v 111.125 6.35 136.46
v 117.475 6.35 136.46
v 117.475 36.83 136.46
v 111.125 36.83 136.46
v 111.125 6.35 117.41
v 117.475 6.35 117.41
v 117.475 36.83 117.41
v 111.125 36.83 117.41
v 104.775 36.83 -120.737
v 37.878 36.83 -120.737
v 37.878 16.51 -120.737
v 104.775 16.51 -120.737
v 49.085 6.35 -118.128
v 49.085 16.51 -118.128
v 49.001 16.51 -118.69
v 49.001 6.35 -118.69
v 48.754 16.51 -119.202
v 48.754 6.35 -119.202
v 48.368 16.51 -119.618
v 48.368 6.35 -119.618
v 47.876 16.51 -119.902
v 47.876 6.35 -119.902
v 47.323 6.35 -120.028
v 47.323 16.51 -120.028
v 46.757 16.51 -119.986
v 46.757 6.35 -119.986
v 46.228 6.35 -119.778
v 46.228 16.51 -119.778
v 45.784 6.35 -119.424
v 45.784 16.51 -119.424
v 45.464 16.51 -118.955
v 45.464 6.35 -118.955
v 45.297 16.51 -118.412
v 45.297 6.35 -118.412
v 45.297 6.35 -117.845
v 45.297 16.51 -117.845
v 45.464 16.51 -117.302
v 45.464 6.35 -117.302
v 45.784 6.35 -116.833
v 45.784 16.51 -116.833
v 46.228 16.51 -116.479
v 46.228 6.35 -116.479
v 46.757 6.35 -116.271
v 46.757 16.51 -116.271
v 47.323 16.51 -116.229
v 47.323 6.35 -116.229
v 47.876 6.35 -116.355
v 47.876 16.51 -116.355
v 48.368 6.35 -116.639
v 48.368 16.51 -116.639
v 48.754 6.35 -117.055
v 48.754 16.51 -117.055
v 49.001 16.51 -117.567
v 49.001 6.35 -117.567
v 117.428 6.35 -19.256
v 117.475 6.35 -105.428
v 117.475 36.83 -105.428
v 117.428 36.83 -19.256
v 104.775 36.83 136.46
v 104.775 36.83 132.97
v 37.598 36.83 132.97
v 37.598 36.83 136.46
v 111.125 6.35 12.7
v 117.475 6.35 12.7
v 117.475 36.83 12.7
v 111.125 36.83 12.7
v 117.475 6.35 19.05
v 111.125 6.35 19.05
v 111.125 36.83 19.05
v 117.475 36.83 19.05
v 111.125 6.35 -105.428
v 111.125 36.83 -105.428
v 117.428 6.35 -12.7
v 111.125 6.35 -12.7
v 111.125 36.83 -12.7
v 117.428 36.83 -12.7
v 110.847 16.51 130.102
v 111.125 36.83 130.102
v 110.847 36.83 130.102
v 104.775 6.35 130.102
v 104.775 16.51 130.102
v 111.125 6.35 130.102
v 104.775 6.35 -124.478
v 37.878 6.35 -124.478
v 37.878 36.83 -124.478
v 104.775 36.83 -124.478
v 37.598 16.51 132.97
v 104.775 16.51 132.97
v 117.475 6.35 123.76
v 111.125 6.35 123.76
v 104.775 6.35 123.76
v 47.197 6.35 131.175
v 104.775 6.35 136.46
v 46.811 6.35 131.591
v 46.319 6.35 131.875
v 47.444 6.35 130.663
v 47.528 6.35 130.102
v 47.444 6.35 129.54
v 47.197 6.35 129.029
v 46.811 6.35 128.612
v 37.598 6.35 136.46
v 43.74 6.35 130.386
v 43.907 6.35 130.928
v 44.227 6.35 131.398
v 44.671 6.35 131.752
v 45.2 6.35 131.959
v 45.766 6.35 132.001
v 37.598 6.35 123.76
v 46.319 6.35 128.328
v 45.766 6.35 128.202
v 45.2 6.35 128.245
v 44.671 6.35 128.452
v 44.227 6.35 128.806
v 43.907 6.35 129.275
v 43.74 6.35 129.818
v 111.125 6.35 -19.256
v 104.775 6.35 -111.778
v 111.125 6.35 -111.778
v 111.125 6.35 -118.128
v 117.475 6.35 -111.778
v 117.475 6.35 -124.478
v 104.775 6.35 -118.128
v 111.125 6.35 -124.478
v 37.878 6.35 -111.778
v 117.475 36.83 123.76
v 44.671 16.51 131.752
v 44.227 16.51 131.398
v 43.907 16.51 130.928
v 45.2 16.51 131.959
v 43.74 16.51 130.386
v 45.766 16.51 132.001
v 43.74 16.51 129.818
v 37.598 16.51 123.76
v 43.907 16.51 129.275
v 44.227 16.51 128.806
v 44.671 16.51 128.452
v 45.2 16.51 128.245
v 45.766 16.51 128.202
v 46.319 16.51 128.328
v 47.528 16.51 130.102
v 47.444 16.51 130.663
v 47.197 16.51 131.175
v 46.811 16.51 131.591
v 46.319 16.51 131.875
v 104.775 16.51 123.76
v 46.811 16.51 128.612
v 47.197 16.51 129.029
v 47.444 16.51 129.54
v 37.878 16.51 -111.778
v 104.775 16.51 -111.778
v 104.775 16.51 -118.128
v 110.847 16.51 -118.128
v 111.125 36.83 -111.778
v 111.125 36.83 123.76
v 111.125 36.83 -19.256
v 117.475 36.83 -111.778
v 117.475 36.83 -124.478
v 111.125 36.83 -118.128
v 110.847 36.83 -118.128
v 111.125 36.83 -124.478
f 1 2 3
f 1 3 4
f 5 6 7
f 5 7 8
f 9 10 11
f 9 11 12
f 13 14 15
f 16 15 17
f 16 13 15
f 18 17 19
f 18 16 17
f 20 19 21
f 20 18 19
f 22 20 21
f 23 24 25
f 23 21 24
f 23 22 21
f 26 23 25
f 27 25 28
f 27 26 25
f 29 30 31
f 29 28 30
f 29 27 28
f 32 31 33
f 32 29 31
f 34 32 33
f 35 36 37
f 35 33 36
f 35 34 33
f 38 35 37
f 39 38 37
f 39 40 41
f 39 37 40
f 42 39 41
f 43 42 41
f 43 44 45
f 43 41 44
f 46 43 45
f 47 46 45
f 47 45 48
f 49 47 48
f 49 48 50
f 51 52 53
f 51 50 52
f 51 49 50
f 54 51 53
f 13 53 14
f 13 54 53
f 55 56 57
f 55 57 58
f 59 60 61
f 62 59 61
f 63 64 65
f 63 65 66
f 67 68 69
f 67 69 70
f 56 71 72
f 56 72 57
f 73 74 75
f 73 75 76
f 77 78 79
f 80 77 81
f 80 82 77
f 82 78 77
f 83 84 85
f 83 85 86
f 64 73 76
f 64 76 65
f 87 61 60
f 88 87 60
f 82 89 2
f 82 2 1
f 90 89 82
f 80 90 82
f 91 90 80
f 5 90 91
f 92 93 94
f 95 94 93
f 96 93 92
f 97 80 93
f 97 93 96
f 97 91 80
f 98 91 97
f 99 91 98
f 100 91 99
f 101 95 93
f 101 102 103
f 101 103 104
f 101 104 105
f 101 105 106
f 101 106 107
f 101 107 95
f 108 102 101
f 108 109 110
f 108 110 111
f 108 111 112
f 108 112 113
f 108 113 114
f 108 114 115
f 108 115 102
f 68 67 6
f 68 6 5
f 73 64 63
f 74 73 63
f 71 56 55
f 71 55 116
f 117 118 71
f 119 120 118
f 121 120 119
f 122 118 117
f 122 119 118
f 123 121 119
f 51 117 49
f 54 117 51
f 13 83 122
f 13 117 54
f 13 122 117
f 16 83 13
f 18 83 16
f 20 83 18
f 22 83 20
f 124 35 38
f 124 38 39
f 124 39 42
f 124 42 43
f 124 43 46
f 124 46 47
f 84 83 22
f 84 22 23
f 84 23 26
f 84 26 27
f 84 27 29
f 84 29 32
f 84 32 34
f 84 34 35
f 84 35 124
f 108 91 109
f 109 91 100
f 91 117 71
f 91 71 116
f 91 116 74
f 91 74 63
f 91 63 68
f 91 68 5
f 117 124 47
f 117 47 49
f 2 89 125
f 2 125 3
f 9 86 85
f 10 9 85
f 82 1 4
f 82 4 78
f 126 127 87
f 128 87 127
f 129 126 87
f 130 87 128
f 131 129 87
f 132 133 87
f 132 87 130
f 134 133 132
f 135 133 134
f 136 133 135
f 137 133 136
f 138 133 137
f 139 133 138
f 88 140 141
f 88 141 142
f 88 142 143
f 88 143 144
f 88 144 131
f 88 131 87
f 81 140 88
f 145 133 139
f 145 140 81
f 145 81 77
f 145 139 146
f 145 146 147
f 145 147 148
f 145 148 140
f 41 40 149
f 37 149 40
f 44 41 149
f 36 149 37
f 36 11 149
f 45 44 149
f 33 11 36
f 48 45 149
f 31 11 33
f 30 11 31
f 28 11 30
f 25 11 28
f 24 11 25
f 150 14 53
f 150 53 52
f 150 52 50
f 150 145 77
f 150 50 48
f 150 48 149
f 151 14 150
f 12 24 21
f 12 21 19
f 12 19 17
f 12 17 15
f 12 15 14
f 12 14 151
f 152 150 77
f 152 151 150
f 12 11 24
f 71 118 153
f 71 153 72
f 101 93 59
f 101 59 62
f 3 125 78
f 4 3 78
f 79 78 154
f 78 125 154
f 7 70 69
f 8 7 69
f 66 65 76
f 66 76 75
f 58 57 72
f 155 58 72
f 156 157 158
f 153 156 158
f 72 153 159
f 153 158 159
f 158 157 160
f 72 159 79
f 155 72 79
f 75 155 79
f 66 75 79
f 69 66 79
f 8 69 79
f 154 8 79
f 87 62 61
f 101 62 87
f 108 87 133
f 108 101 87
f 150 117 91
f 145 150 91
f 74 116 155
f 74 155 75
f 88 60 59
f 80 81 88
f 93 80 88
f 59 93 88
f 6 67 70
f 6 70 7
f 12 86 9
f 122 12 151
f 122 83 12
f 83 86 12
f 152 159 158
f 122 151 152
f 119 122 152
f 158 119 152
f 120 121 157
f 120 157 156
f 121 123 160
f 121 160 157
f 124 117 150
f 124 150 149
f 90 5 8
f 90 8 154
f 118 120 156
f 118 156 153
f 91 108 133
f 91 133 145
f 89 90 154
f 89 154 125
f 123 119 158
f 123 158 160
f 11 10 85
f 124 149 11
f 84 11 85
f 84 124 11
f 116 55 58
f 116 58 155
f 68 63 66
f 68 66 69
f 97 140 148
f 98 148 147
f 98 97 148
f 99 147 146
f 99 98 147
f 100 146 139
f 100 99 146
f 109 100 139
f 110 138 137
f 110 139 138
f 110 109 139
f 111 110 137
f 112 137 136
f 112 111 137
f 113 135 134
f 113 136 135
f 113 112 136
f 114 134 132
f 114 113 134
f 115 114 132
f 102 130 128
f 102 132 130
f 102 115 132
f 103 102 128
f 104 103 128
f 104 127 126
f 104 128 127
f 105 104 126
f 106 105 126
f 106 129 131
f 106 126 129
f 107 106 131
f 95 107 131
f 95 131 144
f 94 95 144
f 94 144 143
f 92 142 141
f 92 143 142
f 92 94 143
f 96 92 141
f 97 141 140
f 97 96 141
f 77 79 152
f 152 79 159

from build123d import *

# Parameters (mm, degrees)
SKETCH2_R           = 1.905
BOSS_EXTRUDE5_DEPTH = 30.48
SKETCH3_W           = 77.139019834
SKETCH3_H           = 253.707230816
CUT_EXTRUDE1_DEPTH  = 20.32


with BuildPart() as part:
    # Sketch2 → Boss-Extrude5 (new body)
    with BuildSketch(Plane(origin=(0, 6.35, 0), x_dir=(1, 0, 0), z_dir=(0, 1, 0))):
        Polygon((37.877734137, 124.478458264), (104.775, 124.478458264), (104.775, 118.128458264), (111.125, 118.128458264), (111.125, 124.478458264), (117.475, 124.478458264), (117.475, 111.778458264), (111.125, 111.778458264), (111.125, 105.428458264), (117.475, 105.428458264), (117.427603838, 19.255527471), (111.125, 19.255527471), (111.125, 12.7), (117.427603838, 12.7), (117.475, -12.7), (111.125, -12.7), (111.125, -19.05), (117.475, -19.05), (117.475, -117.410242597), (111.125, -117.410242597), (111.125, -123.760242597), (117.475, -123.760242597), (117.475, -136.460242597), (111.125, -136.460242597), (111.125, -130.101785028), (104.775, -130.101785028), (104.775, -136.460242597), (37.598341682, -136.460242597), (37.598341682, -123.760242597), (104.775, -123.760242597), (104.775, -111.031020805), (104.775, -24.950677477), (104.775, 19.255527471), (104.775, 25.571960959), (104.775, 99.037268217), (104.775, 105.428458264), (104.775, 111.778458264), (37.877734137, 111.778458264), align=None)
        with Locations((45.623485648, -130.101785028)):
            Circle(SKETCH2_R, mode=Mode.SUBTRACT)
        with Locations((47.180468273, 118.128458264)):
            Circle(SKETCH2_R, mode=Mode.SUBTRACT)
    extrude(amount=BOSS_EXTRUDE5_DEPTH)

    # Sketch3 → Cut-Extrude1 (cut)
    with BuildSketch(Plane(origin=(0, 36.83, 0), x_dir=(1, 0, 0), z_dir=(0, 1, 0))):
        with Locations((72.277192216, -6.116117848)):
            Rectangle(SKETCH3_W, SKETCH3_H)
    extrude(amount=-CUT_EXTRUDE1_DEPTH, mode=Mode.SUBTRACT)


solid = part.part
